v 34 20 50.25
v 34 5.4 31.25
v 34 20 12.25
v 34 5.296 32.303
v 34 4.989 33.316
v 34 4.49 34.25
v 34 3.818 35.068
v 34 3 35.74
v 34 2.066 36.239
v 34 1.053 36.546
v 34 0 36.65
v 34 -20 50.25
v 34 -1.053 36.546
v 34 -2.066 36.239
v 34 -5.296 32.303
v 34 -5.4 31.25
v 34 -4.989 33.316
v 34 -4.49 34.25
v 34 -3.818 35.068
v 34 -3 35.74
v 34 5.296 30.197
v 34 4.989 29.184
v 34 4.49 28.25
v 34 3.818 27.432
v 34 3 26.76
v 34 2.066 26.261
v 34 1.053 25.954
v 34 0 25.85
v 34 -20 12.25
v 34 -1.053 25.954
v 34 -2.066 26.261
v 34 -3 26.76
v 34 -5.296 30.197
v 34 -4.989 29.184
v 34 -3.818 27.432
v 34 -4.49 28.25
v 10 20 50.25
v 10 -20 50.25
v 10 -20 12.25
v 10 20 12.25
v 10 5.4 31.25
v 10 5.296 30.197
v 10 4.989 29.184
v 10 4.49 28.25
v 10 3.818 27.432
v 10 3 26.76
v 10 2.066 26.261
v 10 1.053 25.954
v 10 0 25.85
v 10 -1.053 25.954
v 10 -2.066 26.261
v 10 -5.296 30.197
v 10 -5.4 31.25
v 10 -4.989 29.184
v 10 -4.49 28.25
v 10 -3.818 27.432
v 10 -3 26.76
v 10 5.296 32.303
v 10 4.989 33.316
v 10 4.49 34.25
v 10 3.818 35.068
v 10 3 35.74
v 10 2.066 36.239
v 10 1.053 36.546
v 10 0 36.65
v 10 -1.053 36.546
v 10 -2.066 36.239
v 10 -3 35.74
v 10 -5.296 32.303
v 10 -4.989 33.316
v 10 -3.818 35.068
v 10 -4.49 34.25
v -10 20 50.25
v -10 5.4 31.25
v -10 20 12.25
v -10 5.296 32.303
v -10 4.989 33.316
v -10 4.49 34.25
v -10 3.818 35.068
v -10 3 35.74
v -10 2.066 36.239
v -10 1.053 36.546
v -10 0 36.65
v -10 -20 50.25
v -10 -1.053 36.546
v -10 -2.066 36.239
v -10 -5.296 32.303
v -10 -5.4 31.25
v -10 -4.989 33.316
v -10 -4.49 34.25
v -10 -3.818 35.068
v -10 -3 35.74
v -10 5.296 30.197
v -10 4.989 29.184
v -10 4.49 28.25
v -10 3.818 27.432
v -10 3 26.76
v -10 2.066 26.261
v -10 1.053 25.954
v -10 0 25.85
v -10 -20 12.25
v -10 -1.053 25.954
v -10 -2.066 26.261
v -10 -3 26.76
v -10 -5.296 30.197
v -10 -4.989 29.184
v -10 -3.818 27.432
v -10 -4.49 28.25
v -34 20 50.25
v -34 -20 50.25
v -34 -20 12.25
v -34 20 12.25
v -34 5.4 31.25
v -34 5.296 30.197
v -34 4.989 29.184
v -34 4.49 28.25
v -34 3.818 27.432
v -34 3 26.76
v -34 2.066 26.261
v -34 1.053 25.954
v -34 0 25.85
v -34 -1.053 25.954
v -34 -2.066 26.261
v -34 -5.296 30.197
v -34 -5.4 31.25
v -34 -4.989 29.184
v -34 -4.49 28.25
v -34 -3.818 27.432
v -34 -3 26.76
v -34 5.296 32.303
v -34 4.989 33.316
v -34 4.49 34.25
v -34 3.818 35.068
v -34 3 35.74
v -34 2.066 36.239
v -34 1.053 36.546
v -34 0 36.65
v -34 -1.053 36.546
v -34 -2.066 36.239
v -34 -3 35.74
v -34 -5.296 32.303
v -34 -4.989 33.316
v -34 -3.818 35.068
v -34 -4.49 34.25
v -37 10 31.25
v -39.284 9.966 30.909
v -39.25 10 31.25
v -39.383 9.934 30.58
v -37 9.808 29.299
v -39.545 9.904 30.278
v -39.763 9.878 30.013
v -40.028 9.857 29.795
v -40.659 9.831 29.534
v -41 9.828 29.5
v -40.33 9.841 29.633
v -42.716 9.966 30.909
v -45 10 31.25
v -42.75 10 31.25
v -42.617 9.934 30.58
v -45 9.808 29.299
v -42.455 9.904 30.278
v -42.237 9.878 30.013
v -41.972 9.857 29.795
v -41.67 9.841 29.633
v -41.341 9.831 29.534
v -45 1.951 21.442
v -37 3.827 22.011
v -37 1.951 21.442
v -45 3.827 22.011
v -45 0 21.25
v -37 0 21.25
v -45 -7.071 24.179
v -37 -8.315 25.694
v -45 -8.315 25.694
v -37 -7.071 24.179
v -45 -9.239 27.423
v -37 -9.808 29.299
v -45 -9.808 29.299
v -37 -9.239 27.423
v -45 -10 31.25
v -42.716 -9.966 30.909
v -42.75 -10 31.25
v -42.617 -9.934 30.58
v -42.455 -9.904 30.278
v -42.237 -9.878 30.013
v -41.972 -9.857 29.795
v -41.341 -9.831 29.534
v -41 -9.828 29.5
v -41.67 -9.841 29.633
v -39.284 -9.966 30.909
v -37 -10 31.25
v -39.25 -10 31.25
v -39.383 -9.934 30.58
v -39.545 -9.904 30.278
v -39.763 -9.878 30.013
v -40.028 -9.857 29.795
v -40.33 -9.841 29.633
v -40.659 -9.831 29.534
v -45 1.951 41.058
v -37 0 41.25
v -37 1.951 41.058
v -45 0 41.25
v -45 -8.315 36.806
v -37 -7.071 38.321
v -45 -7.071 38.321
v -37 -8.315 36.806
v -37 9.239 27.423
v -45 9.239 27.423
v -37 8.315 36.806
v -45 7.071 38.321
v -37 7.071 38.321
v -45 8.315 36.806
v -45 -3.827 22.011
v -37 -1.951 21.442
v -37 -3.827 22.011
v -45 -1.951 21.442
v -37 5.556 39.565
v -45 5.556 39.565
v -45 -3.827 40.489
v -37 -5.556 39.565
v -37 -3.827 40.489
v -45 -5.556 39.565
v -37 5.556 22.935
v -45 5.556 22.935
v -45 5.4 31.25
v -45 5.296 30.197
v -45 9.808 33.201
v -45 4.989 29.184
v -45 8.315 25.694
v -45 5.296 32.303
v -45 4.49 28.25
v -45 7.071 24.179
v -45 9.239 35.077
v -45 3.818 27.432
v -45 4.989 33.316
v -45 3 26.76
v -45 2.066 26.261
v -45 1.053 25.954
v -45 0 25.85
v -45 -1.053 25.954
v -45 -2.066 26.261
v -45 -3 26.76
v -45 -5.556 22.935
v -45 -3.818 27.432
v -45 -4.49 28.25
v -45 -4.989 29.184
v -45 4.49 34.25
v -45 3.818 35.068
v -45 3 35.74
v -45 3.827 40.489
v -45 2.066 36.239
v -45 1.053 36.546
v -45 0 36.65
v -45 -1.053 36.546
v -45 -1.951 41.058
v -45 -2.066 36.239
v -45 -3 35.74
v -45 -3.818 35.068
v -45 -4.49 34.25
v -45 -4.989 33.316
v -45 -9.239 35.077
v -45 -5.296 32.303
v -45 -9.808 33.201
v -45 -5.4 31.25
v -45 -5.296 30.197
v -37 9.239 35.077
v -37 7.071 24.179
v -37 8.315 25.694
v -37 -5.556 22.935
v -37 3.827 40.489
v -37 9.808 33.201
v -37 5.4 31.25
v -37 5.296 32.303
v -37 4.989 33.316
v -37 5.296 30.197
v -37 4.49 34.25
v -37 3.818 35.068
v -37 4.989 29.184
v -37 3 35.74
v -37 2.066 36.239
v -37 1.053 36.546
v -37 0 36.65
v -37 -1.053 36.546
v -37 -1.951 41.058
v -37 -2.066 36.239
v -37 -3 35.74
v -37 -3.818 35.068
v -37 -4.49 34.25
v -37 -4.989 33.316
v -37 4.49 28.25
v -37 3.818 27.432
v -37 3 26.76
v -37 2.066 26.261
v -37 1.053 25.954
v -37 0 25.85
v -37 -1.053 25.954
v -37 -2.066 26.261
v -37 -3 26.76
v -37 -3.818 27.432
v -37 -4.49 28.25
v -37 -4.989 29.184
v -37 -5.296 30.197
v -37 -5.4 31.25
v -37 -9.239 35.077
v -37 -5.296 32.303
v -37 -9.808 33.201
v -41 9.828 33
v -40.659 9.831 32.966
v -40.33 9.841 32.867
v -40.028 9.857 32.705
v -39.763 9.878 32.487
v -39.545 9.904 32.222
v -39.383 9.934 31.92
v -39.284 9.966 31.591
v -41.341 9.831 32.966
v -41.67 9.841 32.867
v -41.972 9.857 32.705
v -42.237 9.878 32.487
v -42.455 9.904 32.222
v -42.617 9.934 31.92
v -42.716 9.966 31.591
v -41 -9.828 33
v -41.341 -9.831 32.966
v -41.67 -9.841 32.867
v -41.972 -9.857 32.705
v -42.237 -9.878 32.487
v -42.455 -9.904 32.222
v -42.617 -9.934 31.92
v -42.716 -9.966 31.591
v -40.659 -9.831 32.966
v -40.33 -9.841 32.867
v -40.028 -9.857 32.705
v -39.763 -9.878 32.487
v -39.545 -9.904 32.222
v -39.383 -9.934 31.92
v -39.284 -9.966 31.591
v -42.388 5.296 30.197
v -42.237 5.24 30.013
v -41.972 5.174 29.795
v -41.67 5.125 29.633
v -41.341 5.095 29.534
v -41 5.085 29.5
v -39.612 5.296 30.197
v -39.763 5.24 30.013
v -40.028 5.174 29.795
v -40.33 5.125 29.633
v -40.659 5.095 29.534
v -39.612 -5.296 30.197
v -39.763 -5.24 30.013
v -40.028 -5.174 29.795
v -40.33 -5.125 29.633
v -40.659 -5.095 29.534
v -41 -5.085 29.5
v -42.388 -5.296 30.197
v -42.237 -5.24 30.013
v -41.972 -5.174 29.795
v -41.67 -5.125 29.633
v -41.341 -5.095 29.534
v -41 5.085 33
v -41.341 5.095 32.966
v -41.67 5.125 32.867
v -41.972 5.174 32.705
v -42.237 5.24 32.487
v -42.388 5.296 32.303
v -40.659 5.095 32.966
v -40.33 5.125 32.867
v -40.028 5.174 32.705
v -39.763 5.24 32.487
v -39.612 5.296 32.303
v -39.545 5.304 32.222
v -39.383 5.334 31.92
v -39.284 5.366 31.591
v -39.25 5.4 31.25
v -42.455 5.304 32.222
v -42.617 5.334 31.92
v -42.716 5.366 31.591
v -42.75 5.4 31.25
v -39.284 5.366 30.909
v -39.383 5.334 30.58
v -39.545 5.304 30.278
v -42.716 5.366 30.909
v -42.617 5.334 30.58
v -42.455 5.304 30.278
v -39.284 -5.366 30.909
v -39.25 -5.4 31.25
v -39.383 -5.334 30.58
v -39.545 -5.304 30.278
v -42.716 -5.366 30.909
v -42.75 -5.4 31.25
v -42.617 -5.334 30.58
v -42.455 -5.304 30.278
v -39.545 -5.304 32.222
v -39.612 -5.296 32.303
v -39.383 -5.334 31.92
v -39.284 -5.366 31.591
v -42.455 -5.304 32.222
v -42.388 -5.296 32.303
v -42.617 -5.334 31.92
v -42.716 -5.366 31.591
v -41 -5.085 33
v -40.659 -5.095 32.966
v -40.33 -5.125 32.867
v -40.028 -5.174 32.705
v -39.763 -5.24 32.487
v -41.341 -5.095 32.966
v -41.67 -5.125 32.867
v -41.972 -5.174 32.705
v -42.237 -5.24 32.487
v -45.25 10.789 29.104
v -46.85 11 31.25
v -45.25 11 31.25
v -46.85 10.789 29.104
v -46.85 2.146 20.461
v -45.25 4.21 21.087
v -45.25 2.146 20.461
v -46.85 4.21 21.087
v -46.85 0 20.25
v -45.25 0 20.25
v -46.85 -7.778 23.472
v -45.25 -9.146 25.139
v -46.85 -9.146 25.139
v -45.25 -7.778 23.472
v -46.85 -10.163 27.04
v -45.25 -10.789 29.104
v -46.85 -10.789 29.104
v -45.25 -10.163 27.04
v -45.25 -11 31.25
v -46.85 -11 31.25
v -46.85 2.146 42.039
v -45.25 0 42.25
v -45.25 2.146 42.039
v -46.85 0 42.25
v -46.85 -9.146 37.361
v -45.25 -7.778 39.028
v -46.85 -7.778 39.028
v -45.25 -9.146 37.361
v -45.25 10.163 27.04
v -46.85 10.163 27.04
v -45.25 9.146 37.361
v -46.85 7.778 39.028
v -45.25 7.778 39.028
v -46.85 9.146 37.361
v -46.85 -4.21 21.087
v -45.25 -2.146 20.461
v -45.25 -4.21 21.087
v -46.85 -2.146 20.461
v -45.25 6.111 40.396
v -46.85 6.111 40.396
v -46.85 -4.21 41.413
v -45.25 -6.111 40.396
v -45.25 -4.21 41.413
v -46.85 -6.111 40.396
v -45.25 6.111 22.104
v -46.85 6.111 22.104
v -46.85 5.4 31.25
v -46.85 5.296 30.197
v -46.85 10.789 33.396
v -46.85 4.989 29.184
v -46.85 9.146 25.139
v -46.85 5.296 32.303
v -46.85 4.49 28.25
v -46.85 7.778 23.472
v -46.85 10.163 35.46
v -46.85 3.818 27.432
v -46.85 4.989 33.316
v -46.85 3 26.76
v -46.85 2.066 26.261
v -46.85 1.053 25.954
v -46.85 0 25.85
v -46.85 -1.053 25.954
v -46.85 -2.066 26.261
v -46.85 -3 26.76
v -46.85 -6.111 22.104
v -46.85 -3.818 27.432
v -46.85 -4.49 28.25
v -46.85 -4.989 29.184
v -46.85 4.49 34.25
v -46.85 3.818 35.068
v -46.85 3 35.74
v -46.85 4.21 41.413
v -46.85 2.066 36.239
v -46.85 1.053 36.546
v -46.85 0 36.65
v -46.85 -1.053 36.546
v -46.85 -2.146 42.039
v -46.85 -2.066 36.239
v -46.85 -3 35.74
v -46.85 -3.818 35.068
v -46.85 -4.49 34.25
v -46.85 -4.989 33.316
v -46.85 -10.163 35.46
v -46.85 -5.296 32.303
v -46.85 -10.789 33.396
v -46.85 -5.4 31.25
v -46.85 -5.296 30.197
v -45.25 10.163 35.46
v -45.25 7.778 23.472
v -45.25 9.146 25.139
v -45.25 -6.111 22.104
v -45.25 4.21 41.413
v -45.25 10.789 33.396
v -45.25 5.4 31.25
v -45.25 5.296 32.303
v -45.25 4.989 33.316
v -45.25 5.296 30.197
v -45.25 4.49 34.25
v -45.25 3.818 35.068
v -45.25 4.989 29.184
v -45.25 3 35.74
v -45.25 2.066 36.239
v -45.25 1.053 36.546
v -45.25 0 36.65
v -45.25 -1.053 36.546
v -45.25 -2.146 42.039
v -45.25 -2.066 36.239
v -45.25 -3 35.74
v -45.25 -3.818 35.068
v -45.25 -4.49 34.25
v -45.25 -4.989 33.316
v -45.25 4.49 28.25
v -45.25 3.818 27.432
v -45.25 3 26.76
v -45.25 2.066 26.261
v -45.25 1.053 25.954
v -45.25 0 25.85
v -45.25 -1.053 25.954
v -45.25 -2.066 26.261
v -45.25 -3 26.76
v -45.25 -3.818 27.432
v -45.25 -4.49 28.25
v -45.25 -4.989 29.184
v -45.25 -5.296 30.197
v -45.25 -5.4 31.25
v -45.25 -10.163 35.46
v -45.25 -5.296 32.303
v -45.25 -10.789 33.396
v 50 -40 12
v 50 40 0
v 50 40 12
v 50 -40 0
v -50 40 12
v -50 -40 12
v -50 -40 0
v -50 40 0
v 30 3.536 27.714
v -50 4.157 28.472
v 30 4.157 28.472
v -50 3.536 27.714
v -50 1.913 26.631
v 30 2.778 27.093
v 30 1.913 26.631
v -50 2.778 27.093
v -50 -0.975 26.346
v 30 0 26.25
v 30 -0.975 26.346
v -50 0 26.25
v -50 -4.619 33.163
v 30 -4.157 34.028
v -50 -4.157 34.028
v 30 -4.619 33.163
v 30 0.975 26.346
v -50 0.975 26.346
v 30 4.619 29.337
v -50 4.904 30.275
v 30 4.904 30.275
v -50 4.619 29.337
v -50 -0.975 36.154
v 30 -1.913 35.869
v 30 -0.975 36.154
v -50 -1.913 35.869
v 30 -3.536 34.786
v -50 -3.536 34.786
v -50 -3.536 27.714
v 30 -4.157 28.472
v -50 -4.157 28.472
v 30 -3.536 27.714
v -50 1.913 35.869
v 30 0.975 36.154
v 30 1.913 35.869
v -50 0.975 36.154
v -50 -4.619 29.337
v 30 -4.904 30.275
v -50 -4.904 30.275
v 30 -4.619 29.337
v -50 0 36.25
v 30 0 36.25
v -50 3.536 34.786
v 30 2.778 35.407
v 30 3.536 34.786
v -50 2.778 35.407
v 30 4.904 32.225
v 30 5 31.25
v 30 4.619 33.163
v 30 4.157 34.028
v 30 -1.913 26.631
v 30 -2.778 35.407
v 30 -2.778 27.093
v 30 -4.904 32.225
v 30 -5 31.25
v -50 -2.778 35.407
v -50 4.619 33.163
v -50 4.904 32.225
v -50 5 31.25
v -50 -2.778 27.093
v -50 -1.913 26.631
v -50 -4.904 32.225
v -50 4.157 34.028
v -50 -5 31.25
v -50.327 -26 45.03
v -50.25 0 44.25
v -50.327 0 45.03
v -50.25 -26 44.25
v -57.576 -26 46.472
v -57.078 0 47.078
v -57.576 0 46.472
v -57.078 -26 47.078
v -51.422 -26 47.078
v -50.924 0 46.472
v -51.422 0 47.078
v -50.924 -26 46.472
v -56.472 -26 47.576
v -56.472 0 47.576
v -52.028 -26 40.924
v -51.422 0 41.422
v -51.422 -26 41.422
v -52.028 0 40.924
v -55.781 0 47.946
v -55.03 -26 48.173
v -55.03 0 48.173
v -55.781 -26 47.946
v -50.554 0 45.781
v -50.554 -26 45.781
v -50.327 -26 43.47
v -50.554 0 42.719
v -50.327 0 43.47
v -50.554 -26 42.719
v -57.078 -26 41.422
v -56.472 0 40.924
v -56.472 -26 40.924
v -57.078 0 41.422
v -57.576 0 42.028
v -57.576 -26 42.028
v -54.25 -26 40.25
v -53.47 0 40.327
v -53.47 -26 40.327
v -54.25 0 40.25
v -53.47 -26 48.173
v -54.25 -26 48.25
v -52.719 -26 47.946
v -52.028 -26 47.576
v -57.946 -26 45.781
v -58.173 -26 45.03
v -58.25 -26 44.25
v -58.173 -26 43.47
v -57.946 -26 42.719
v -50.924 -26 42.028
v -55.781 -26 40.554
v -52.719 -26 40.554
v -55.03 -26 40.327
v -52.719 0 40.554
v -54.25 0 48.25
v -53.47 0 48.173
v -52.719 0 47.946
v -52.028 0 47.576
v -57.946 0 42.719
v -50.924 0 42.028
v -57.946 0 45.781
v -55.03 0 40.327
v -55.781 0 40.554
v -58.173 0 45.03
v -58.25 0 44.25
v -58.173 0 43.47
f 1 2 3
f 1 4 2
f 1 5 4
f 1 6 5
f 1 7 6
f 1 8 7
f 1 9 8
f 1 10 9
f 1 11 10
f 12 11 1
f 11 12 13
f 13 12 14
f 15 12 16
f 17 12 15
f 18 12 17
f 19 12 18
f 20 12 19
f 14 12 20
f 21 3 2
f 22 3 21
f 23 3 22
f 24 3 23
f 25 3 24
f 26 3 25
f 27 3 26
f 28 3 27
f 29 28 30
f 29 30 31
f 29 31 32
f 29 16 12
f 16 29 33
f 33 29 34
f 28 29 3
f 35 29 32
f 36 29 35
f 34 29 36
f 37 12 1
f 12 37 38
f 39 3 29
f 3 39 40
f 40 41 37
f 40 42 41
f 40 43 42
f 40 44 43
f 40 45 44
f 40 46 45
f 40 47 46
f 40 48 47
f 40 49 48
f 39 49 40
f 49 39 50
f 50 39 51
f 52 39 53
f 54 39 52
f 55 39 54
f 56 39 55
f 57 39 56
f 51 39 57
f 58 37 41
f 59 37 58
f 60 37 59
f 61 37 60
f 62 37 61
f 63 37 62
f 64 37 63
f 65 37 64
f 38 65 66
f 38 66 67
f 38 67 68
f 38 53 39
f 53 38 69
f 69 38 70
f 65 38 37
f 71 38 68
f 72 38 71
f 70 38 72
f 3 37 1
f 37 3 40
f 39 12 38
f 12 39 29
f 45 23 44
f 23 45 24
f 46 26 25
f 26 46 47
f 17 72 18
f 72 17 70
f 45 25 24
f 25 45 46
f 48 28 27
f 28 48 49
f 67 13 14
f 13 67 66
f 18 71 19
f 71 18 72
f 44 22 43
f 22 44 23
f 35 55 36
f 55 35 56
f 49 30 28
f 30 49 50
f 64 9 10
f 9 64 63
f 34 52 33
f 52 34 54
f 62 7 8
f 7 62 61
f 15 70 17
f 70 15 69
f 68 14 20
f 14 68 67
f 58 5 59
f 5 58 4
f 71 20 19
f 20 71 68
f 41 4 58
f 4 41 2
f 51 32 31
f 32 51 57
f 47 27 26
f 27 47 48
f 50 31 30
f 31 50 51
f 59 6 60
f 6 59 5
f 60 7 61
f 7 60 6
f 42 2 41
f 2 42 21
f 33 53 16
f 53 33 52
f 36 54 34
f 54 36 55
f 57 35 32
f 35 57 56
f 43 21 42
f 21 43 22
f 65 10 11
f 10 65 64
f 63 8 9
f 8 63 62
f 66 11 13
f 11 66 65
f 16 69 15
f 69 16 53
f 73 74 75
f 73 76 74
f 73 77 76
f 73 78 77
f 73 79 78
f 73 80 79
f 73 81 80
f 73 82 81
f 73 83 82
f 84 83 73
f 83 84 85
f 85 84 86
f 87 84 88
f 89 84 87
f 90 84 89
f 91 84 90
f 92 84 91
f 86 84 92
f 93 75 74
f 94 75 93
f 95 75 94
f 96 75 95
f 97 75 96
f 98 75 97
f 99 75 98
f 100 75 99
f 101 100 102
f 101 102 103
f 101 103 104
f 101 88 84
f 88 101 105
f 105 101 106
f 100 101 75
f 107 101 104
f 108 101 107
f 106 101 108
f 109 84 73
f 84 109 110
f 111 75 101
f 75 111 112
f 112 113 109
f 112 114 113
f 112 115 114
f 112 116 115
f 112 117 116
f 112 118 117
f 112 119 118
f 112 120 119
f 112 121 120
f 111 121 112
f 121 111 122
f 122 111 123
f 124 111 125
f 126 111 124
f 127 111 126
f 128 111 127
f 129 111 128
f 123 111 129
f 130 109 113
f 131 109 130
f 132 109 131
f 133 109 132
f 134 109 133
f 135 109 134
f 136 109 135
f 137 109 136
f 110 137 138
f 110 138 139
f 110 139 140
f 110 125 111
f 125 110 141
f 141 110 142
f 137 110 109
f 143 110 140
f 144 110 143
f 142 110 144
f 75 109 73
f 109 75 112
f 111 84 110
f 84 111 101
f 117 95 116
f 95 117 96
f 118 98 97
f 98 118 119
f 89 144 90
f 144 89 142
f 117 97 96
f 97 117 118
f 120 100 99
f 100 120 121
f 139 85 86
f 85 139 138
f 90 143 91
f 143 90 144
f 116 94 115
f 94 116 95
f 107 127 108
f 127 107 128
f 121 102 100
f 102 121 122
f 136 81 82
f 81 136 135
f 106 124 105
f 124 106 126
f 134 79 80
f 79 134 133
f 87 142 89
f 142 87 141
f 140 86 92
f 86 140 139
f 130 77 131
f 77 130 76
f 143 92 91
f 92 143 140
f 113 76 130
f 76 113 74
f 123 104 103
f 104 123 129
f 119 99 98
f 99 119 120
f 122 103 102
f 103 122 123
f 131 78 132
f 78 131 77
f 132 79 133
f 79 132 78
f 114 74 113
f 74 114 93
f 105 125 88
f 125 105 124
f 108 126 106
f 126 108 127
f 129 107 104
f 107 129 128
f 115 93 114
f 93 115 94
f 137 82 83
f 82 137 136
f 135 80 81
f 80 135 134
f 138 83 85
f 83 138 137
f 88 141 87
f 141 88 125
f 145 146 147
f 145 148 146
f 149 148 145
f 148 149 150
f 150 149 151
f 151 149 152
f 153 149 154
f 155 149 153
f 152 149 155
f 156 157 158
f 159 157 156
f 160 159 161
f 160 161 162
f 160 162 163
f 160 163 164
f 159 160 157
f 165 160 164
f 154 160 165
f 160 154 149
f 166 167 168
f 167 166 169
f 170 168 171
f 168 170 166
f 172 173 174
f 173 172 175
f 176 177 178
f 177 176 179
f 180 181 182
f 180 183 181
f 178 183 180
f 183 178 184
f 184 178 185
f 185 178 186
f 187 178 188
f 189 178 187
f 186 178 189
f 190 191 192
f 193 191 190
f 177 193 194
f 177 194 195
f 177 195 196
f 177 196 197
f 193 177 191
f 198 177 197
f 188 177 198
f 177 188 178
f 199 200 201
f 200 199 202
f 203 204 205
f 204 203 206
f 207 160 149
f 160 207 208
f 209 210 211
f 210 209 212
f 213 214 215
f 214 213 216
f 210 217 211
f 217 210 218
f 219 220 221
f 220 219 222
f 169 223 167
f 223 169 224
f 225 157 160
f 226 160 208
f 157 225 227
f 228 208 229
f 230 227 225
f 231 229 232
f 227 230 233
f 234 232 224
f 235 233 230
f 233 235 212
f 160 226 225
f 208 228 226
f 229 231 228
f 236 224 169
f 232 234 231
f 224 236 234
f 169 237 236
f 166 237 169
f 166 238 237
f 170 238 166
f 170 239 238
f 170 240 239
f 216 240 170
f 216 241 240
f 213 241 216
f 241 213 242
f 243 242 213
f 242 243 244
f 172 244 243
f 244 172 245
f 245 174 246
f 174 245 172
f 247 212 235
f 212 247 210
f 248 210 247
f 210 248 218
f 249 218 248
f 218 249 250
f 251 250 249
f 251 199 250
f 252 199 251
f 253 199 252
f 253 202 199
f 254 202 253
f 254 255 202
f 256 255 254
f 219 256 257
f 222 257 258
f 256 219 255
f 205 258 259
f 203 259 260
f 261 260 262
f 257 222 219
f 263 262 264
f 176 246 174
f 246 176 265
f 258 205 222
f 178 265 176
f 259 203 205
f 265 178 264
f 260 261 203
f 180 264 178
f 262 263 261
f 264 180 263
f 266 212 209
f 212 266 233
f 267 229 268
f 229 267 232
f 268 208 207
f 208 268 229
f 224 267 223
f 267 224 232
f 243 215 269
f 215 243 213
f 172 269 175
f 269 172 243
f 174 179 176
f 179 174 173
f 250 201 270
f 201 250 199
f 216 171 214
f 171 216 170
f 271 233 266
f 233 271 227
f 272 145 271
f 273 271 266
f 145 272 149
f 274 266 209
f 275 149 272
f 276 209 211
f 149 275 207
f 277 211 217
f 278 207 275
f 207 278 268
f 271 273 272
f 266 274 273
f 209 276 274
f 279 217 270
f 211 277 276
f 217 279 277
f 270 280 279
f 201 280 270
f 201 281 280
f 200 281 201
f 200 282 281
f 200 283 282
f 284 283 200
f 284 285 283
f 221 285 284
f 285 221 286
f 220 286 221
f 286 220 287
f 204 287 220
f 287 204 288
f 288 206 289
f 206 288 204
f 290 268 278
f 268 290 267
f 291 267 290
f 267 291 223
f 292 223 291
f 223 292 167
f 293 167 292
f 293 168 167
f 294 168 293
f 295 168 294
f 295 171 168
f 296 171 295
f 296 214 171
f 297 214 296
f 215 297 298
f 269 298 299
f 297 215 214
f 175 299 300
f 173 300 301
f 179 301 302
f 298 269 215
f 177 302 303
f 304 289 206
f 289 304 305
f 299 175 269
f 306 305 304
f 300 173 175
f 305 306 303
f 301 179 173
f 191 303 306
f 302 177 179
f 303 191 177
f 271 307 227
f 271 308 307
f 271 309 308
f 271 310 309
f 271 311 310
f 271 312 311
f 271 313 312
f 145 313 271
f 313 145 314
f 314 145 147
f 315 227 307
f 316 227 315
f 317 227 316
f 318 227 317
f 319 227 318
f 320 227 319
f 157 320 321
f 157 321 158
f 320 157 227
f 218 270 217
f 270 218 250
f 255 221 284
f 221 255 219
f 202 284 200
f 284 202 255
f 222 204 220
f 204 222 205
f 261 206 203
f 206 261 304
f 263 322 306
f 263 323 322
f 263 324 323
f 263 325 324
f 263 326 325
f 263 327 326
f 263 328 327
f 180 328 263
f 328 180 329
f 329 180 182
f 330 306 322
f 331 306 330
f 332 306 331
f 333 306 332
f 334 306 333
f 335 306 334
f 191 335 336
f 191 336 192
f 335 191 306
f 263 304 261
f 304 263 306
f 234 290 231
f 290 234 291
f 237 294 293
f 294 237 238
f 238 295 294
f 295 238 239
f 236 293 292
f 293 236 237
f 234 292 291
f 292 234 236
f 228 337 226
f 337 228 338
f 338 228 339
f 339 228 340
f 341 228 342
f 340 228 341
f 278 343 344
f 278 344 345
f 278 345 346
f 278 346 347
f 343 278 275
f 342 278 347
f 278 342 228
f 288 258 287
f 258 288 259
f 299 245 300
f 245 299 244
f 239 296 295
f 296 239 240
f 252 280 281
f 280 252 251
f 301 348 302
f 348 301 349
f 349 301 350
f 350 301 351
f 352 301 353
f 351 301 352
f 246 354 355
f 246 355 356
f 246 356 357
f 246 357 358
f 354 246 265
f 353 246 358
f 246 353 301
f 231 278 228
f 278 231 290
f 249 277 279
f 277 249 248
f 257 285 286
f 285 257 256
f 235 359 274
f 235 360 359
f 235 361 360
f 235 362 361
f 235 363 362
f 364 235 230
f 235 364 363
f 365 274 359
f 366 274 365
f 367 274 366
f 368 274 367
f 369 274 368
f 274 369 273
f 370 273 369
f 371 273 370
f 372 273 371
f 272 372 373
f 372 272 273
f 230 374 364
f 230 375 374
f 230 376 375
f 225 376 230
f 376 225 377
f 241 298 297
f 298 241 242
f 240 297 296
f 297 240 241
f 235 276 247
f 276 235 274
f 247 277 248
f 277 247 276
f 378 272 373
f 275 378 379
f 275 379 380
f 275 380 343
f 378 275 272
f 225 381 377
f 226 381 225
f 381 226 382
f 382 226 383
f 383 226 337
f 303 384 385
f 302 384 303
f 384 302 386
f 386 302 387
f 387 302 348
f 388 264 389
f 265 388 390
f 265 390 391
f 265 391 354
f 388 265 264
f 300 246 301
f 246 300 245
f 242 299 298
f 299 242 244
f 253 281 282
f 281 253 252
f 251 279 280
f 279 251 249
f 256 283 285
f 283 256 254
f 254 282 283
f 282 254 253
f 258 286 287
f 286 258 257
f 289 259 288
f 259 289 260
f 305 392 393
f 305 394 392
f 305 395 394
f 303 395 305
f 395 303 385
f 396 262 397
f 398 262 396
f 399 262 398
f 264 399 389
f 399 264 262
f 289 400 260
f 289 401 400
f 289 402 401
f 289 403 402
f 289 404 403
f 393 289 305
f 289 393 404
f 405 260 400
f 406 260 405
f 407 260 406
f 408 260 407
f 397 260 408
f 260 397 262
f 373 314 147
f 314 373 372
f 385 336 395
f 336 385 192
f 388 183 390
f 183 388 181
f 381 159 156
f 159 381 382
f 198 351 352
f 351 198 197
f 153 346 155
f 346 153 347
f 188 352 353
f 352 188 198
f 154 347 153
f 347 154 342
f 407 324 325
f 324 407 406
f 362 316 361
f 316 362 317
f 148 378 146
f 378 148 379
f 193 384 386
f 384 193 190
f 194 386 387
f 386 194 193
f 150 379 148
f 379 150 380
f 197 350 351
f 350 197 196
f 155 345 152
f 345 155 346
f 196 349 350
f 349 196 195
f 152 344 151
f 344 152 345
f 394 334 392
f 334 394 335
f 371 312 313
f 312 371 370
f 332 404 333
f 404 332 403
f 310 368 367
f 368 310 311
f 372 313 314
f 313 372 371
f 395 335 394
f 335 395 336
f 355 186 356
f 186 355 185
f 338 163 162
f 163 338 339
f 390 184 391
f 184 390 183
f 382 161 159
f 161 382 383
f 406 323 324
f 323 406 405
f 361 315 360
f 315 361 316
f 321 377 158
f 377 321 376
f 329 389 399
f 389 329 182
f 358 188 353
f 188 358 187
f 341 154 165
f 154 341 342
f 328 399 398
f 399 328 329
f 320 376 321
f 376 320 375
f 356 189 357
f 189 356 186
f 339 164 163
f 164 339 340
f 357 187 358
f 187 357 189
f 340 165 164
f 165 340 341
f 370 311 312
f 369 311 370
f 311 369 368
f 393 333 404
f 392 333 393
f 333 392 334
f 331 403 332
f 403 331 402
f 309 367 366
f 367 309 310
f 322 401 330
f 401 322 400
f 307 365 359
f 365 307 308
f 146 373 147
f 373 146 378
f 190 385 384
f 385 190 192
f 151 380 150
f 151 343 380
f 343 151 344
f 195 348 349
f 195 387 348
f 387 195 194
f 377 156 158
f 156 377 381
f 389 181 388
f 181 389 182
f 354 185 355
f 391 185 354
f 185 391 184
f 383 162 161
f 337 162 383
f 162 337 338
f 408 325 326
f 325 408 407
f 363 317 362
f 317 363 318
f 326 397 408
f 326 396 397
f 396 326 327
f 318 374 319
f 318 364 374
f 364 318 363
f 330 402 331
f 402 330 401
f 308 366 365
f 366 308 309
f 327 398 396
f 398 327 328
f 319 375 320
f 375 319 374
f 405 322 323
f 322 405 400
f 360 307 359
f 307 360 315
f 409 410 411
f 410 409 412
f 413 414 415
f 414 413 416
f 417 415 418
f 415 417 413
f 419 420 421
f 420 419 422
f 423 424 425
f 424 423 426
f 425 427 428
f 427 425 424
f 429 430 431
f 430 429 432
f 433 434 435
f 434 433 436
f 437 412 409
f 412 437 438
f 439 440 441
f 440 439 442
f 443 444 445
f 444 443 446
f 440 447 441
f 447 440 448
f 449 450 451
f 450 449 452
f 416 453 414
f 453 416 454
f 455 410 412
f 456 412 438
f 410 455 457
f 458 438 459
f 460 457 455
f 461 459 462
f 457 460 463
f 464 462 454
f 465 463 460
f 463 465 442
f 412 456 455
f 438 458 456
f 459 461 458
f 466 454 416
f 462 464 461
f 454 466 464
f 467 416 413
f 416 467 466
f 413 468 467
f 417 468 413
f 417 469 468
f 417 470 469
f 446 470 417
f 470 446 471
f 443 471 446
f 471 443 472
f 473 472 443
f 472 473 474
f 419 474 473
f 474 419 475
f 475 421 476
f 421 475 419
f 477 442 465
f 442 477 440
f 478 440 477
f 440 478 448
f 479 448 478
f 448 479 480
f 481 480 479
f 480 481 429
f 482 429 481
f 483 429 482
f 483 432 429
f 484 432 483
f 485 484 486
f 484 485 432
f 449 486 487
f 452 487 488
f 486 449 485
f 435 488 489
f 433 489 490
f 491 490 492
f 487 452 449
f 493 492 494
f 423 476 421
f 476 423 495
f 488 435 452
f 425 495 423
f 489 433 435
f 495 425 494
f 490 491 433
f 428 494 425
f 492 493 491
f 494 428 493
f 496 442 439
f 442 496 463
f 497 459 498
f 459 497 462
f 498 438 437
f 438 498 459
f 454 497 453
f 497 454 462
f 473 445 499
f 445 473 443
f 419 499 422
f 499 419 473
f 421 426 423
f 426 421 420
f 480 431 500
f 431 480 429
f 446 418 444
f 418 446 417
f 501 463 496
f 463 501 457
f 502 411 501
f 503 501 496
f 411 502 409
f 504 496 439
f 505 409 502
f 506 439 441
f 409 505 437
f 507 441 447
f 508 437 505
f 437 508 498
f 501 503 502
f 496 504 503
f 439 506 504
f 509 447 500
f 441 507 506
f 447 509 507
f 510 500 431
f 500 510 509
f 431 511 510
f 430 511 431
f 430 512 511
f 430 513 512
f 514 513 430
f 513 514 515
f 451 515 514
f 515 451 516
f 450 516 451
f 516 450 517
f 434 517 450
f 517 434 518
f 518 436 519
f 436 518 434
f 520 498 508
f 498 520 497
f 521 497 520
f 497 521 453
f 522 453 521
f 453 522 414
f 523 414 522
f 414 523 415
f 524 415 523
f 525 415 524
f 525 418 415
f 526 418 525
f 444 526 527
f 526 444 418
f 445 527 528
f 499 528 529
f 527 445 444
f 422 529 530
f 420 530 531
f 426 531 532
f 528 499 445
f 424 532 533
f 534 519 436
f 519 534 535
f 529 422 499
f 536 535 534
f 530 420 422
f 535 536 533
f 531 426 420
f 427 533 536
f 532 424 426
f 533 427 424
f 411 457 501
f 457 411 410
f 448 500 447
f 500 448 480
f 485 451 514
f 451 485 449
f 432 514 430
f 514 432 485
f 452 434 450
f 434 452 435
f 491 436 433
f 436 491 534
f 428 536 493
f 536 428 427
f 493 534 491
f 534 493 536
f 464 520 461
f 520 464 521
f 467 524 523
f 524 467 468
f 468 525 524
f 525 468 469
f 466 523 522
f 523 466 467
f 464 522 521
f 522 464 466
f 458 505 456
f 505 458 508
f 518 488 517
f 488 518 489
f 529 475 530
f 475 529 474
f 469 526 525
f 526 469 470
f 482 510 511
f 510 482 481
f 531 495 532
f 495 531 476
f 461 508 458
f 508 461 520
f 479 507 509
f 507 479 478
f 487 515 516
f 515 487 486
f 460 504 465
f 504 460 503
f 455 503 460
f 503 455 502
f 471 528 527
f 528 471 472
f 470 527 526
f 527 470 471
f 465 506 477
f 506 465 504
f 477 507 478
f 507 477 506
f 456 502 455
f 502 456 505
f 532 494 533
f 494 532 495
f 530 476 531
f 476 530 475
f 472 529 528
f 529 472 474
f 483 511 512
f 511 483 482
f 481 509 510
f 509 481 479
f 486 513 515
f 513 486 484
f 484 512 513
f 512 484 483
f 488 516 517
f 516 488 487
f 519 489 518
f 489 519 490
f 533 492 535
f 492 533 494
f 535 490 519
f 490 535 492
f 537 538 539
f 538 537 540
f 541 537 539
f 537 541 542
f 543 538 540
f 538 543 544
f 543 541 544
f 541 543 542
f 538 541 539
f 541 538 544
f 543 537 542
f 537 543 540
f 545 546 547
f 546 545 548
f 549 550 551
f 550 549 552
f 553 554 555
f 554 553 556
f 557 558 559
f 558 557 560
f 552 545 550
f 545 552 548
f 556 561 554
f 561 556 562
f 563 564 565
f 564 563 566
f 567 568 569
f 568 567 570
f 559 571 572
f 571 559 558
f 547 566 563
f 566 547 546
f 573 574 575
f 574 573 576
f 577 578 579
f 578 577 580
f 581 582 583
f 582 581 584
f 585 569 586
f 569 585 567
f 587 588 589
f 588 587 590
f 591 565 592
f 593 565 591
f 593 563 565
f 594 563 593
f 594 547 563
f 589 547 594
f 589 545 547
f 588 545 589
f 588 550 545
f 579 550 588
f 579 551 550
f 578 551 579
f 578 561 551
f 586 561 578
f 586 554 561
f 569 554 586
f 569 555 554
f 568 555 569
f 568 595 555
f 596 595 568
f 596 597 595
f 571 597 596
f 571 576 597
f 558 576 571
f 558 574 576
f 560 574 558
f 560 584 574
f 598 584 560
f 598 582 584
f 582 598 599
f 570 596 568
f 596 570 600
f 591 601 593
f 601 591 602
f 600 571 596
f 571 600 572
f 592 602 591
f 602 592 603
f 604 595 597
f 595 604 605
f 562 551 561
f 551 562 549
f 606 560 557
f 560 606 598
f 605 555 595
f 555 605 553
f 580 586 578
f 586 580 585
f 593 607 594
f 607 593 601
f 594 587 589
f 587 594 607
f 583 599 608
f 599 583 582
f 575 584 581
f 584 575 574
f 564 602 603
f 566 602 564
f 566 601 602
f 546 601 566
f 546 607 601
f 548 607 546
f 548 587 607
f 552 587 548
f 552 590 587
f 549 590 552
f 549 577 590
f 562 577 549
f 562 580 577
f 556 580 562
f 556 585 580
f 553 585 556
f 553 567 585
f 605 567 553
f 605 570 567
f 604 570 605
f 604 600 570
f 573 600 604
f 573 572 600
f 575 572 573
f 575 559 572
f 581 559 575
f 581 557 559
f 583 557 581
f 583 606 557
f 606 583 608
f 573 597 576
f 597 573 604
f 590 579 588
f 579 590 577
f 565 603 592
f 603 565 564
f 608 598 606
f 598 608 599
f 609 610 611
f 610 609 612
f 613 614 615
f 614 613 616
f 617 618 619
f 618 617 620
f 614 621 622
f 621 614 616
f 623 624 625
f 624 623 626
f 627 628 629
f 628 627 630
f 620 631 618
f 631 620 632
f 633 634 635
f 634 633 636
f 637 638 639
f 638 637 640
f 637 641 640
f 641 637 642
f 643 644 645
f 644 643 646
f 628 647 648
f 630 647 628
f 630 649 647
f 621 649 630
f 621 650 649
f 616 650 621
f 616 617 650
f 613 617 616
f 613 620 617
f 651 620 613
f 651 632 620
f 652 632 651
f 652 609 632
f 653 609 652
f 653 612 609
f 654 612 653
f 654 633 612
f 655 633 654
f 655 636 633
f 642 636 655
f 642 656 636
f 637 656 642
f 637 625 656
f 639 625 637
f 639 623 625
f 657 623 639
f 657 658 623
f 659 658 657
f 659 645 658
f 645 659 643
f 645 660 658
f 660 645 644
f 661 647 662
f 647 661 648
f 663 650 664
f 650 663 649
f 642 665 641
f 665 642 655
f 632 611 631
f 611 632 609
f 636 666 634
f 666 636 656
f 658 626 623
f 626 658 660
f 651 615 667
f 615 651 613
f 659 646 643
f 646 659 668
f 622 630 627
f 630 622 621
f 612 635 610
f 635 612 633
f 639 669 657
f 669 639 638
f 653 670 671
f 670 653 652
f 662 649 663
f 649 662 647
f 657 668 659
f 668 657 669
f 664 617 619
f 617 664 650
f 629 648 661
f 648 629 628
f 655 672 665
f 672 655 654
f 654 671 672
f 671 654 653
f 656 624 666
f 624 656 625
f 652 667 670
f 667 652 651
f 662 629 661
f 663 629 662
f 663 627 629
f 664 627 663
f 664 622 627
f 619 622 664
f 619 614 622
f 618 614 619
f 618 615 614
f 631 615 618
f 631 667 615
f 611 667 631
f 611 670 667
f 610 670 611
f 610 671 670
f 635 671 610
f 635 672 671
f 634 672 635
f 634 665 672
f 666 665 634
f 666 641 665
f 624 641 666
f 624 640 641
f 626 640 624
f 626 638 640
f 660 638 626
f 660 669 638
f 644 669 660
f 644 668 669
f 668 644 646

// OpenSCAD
$fn = 32;

// ------------------------------------------------------------------------
// Machine vise: screw d10, jaws 24 x 38 mm
// Every part is its own module, assembly() places every instance.
// ------------------------------------------------------------------------

// --- part 1 ---
module vise_bed() {
  difference() {
    translate([-50, -40, 0]) cube([100, 80, 12]);
  }
}

// --- part 2 ---
module vise_jaw() {
  difference() {
    translate([-12, -20, 0]) cube([24, 40, 38]);
    translate([0, 0, 19]) rotate([0, 90, 0]) cylinder(h = 26, d = 10.8, center = true);
  }
}

// --- part 3 ---
module vise_screw() {
  translate([0, 0, -40]) cylinder(h = 80, d = 10);
}

// --- part 4 ---
module screw_collar() {
  difference() {
    cylinder(h = 8, d = 20);
    translate([0, 0, -1]) cylinder(h = 10, d = 10.8);
    translate([0, 0, 4]) rotate([90, 0, 0]) cylinder(h = 22, d = 3.5, center = true);
  }
}

// --- part 5 ---
module screw_washer() {
  difference() {
      translate([0, 0, 0]) cylinder(h = 1.6, d = 22);
      translate([0, 0, -1]) cylinder(h = 3.6, d = 10.8);
    }
}

// --- part 6 ---
module vise_handle() {
  cylinder(h = 26, d = 8);
}

// --- assembly ---
module assembly() {
  color([0.80, 0.24, 0.20]) translate([0, 0, 0]) rotate([0, 0, 0]) vise_bed();
  color([0.20, 0.45, 0.75]) translate([22, 0, 12.25]) rotate([0, 0, 0]) vise_jaw();
  color([0.25, 0.62, 0.32]) translate([-22, 0, 12.25]) rotate([0, 0, 0]) vise_jaw();
  color([0.92, 0.70, 0.18]) translate([-10, 0, 31.25]) rotate([0, 90, 0]) vise_screw();
  color([0.58, 0.35, 0.70]) translate([-45, 0, 31.25]) rotate([0, 90, 0]) screw_collar();
  color([0.16, 0.66, 0.66]) translate([-46.85, 0, 31.25]) rotate([0, 90, 0]) screw_washer();
  color([0.85, 0.48, 0.18]) translate([-54.25, 0, 44.25]) rotate([90, 0, 0]) vise_handle();
}

assembly();
